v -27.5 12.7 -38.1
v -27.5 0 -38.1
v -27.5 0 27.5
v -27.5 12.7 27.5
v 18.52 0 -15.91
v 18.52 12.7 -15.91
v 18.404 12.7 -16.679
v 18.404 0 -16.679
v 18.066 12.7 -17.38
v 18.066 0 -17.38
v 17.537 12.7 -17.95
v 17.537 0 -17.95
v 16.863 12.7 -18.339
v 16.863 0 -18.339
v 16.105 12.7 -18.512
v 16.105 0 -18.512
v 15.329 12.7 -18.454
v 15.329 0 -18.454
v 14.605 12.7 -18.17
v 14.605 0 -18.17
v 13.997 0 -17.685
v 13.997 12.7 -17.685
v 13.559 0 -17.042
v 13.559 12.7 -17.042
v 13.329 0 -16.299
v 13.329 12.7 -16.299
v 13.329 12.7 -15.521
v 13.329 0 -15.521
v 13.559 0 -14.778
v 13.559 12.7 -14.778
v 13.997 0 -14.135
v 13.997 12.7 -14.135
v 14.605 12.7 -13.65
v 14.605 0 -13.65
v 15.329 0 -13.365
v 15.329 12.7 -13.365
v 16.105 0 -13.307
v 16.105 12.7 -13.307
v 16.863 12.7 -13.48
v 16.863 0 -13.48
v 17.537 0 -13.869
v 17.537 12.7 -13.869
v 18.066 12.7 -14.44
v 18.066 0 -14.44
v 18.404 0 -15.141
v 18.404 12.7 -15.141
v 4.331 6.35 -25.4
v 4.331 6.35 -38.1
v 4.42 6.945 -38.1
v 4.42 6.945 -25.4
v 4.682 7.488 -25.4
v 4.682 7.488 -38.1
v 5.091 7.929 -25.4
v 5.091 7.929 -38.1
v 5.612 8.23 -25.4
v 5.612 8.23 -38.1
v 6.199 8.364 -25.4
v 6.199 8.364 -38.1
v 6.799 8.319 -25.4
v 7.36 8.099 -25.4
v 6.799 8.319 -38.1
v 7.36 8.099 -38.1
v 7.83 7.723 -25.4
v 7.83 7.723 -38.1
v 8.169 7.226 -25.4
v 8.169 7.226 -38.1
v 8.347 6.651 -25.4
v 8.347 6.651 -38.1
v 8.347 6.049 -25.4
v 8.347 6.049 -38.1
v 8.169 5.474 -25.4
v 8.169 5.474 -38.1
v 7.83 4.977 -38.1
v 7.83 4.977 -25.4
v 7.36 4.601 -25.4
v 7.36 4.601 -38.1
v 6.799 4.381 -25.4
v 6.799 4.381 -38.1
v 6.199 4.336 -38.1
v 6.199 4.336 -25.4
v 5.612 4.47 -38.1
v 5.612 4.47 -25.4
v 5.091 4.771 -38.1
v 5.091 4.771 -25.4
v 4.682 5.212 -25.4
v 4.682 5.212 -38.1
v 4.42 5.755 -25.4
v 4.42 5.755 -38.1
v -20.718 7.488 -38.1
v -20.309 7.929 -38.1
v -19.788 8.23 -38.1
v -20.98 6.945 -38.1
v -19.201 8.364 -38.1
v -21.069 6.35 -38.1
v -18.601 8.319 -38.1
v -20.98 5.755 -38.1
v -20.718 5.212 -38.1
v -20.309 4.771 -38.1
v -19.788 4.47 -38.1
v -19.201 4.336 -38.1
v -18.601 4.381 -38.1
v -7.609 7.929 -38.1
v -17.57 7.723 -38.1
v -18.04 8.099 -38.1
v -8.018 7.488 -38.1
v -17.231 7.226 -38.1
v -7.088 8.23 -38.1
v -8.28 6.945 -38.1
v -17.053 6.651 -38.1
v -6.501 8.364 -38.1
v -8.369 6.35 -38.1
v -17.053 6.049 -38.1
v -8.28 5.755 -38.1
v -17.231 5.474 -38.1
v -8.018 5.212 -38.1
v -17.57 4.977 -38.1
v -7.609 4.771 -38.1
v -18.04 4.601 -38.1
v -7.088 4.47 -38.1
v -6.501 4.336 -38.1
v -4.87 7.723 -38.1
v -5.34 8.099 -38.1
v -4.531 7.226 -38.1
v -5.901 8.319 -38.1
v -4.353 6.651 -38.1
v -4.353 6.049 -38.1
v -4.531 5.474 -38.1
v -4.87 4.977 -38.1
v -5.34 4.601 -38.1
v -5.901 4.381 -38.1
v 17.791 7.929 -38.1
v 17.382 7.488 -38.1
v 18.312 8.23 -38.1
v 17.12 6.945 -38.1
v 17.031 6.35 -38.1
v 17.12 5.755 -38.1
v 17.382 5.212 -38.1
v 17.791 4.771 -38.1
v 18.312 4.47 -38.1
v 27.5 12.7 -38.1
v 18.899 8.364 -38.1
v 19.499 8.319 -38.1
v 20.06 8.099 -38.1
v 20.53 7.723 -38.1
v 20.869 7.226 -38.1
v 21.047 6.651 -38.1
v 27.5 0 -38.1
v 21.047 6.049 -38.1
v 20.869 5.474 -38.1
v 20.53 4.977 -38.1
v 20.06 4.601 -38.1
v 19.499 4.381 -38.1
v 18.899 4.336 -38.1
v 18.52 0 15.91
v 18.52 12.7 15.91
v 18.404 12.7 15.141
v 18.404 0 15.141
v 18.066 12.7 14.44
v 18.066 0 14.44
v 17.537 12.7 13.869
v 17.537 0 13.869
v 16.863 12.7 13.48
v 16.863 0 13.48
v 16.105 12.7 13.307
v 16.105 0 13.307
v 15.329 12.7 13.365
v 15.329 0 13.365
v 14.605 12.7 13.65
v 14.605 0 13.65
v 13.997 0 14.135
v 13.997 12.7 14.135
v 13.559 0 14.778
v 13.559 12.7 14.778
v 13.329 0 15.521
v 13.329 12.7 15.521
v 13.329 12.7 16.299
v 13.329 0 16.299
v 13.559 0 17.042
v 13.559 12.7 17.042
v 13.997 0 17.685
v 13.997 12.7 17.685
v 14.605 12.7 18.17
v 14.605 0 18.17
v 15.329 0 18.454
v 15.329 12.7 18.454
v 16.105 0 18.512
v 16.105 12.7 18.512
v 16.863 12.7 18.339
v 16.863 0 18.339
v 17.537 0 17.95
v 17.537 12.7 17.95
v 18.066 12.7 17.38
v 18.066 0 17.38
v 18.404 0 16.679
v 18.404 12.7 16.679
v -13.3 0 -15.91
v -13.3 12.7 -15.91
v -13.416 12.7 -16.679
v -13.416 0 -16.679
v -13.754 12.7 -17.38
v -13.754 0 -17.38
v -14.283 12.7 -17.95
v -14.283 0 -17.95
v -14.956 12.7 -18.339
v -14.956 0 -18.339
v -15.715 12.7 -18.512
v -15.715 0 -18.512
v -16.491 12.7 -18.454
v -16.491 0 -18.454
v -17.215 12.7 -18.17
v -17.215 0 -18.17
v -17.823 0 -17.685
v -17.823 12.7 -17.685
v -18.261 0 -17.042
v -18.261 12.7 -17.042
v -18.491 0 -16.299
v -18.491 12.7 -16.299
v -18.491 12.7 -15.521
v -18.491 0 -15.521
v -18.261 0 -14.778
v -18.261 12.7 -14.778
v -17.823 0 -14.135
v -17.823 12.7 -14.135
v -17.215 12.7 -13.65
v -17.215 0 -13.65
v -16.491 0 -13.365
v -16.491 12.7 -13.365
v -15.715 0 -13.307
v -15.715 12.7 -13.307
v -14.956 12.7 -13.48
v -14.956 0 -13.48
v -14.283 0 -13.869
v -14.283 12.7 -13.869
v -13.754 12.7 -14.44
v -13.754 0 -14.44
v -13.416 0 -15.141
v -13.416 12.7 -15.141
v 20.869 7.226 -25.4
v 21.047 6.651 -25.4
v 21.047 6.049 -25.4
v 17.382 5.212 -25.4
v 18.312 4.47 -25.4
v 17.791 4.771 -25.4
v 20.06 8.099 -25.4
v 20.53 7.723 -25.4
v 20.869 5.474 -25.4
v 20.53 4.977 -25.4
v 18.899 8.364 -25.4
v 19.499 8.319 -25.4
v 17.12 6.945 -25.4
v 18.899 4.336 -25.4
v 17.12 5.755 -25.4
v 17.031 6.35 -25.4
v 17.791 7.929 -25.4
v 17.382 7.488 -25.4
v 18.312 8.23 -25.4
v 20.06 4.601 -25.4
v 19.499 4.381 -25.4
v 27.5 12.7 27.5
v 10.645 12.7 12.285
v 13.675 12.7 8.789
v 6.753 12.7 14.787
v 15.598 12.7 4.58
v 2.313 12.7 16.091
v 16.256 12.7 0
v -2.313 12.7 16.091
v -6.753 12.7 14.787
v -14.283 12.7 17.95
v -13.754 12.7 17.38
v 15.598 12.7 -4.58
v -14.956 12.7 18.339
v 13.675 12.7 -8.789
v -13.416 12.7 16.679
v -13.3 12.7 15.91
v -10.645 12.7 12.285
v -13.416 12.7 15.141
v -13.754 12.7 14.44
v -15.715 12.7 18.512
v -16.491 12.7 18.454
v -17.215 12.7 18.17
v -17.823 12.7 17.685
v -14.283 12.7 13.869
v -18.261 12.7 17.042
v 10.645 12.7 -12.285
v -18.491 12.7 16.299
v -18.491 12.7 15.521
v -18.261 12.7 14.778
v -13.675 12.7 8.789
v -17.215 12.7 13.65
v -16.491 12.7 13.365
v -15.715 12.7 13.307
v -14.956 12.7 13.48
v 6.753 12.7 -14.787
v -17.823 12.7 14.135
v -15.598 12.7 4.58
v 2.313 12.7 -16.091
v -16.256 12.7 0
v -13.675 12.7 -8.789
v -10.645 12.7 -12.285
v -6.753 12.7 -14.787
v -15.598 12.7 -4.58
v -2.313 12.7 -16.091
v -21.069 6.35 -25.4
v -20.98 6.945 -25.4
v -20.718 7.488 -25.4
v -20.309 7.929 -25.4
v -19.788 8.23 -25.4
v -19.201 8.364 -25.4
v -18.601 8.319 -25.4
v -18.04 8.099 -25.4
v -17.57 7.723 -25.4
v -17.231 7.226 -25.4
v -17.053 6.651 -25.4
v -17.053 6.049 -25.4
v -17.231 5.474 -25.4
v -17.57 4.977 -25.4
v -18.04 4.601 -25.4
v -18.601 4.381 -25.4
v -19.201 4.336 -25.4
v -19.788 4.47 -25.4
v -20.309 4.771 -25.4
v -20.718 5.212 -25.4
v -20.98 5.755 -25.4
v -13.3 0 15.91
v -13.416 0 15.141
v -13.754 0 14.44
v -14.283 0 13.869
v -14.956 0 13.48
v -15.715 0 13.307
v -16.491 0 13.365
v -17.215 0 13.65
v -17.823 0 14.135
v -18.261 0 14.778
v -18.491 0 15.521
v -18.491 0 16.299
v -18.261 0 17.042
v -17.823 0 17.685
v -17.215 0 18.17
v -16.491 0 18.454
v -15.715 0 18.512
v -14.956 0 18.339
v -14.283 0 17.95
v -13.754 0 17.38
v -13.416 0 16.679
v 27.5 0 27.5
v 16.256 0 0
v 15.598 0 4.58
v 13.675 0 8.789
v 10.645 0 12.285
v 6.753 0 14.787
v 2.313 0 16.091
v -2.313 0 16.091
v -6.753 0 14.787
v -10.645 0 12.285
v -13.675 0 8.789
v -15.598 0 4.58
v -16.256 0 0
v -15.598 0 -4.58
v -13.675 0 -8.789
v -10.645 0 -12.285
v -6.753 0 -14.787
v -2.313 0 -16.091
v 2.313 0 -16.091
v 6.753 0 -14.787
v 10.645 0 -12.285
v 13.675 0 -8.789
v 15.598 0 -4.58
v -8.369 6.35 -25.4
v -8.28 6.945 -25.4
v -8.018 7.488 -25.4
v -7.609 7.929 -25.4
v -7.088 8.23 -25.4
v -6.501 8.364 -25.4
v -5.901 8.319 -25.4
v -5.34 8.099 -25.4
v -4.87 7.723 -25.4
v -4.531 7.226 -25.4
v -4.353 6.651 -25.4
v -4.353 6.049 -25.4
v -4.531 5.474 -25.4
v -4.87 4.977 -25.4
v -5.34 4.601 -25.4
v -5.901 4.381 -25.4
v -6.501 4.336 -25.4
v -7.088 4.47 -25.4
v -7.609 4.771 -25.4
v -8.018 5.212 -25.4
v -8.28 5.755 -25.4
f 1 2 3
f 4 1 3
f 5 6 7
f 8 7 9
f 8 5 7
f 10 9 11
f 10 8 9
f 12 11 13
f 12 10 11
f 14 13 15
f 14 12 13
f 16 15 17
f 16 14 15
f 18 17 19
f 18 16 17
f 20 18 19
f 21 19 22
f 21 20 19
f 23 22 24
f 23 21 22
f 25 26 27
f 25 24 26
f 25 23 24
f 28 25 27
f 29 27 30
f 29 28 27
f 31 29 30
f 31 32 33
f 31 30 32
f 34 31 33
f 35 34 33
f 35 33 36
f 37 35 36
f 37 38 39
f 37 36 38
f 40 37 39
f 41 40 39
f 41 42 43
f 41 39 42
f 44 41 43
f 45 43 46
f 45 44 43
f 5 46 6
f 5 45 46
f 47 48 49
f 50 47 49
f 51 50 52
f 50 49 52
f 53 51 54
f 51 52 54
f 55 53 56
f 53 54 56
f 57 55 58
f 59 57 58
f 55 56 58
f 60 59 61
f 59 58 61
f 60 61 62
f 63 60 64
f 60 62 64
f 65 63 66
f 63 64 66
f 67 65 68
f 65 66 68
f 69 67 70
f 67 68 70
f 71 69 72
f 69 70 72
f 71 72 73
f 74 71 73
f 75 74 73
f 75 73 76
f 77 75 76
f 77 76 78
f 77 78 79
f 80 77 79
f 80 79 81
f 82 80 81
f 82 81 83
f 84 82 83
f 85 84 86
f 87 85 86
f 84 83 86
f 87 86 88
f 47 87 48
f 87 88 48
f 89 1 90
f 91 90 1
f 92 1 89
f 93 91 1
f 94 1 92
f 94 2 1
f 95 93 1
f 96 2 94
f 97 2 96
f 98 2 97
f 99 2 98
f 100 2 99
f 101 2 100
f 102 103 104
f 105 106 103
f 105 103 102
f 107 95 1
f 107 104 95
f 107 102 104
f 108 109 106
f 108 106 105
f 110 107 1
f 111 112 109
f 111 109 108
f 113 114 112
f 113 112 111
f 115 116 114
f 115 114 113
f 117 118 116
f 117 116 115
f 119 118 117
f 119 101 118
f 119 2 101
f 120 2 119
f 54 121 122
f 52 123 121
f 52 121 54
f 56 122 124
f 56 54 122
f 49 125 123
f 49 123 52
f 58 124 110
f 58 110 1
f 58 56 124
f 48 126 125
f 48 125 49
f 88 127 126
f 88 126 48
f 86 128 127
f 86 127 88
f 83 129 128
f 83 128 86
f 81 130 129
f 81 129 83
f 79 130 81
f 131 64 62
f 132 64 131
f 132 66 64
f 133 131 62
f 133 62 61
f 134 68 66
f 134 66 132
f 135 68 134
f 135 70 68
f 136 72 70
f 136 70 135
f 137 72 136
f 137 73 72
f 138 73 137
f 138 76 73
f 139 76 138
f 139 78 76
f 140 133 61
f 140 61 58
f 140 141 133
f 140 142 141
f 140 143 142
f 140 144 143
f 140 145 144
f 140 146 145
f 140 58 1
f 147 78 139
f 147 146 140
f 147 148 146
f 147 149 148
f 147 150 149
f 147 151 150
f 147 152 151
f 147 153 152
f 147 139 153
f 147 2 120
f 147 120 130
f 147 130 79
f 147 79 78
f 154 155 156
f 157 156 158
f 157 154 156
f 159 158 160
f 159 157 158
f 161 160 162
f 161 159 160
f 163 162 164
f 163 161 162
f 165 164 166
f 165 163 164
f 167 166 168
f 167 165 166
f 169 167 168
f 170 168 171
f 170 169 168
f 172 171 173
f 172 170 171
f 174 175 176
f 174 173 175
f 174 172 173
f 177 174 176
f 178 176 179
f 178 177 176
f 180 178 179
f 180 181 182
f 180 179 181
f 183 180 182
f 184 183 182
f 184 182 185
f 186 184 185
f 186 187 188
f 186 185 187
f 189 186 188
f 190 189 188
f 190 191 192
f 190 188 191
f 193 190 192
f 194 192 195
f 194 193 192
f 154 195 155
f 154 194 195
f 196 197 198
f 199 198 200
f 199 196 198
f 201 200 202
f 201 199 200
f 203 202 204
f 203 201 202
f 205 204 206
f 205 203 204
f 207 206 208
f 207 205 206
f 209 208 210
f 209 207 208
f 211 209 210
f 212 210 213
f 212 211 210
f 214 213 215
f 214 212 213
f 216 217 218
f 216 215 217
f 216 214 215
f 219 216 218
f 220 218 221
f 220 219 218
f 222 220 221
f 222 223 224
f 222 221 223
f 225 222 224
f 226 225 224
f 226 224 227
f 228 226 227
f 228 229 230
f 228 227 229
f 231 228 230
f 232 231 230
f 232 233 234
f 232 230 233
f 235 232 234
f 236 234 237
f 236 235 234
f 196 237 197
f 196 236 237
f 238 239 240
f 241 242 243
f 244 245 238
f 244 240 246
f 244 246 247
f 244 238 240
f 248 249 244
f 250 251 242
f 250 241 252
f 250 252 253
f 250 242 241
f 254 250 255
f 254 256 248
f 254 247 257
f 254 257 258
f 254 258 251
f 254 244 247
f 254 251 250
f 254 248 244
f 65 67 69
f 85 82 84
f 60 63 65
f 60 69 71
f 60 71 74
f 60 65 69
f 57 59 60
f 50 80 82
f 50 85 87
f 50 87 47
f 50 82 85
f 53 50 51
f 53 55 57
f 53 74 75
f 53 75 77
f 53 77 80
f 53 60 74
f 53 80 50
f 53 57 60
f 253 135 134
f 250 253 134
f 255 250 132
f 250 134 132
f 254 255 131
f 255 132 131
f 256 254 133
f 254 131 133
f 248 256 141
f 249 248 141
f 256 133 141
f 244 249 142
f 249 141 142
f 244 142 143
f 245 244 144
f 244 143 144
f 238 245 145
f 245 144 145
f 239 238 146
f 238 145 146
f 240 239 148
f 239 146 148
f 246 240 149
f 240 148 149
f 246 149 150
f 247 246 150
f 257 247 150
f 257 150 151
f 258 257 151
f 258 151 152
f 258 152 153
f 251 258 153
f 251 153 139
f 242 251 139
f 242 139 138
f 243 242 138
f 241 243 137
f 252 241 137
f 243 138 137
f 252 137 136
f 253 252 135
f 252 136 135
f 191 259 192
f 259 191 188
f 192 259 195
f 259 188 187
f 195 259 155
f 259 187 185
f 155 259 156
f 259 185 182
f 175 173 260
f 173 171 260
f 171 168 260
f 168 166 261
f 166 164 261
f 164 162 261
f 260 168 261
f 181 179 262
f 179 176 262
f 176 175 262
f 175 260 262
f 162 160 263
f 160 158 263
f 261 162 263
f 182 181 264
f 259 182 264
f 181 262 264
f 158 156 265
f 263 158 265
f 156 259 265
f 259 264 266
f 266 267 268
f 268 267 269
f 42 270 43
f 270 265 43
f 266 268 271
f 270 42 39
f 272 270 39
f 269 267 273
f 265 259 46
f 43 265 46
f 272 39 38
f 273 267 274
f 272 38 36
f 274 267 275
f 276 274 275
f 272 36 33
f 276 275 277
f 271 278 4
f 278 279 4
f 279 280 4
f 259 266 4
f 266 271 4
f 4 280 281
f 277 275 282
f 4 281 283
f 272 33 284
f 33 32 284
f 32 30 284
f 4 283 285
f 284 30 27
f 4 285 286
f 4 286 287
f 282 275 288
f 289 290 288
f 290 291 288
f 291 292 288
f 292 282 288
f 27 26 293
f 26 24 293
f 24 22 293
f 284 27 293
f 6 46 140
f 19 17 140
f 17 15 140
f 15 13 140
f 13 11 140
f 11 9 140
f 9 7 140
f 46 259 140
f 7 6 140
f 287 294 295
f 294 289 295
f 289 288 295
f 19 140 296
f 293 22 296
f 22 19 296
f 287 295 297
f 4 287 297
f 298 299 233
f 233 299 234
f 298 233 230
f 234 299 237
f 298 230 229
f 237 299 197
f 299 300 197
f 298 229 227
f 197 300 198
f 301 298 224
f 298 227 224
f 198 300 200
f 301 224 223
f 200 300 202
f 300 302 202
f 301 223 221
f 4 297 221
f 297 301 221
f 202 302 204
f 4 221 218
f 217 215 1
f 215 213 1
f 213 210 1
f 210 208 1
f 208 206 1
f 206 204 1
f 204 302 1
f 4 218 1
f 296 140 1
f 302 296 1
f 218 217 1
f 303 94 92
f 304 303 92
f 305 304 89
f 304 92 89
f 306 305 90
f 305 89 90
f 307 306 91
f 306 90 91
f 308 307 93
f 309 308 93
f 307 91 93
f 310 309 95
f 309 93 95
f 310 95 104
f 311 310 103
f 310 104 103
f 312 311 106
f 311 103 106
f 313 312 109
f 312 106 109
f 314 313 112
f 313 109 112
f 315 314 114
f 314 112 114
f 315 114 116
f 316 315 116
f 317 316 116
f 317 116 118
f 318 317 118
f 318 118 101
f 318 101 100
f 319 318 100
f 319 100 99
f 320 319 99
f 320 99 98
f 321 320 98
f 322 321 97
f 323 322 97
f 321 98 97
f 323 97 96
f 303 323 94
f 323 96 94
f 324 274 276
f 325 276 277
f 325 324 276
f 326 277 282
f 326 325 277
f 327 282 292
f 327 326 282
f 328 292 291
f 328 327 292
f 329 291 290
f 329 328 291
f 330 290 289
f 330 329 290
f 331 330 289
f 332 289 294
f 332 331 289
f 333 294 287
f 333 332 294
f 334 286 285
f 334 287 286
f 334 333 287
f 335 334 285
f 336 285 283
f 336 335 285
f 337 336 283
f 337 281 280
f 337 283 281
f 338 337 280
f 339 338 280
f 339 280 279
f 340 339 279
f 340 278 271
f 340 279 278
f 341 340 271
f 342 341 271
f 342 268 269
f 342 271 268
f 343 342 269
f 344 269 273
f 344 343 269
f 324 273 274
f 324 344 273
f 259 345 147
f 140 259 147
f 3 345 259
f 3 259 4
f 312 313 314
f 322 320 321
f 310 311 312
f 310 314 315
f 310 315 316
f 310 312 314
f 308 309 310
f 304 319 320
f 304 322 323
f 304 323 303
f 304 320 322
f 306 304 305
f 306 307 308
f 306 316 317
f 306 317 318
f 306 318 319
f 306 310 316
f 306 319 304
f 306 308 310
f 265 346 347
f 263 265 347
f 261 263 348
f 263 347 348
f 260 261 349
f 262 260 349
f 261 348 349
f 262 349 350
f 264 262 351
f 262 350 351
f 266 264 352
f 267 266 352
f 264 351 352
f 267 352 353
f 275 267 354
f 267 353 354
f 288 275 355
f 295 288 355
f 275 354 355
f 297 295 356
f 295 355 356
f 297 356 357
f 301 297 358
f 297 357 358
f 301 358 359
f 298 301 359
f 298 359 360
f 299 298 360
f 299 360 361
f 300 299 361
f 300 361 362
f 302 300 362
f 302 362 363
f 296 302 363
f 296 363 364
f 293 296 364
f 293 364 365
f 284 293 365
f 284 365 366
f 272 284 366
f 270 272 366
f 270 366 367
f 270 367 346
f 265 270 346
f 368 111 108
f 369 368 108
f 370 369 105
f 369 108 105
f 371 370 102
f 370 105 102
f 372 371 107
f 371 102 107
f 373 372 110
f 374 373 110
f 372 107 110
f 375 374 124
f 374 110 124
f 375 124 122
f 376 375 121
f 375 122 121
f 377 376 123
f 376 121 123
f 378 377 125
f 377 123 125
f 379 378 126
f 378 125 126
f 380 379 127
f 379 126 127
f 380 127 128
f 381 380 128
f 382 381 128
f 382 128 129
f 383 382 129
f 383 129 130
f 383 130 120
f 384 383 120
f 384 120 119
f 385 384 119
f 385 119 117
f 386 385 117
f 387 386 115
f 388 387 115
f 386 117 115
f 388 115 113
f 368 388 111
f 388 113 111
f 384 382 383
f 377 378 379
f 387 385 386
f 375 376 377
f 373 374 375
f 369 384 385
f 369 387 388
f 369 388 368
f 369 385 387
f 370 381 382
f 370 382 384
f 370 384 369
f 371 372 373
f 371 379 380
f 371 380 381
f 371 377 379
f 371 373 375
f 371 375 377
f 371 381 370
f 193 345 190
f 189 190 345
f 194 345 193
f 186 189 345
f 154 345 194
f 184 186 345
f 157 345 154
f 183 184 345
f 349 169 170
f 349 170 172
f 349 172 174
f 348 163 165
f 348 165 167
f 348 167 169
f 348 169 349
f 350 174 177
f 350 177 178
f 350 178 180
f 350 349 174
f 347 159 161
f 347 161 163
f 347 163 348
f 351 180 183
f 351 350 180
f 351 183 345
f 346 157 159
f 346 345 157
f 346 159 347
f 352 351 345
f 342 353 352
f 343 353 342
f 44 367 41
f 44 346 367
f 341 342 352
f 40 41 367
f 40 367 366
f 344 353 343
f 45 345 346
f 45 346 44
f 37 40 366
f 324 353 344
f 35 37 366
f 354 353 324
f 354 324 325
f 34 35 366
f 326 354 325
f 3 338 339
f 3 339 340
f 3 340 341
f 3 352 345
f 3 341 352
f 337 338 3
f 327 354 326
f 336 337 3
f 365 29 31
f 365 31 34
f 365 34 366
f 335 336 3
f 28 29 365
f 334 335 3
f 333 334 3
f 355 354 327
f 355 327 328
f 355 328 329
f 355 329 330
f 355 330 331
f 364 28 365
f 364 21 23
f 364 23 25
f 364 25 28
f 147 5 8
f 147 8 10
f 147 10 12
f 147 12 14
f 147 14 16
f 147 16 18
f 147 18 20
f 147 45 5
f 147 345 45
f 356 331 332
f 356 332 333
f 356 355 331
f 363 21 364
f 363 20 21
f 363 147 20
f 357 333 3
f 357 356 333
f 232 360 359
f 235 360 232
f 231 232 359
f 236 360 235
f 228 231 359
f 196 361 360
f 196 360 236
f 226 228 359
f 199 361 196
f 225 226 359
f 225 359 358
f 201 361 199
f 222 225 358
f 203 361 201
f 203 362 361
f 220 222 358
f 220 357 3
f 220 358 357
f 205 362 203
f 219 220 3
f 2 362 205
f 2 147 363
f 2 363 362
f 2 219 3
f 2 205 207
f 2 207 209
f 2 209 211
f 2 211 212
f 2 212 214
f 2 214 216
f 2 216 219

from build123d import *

# Parameters (mm, degrees)
BOSS_EXTRUDE1_DEPTH = 12.7
CUT_EXTRUDE1_REACH  = 14.7
SKETCH1_R           = 2.60985
CUT_EXTRUDE2_REACH  = 14.7
SKETCH3_R           = 16.256
SKETCH5_R           = 2.0193
CUT_EXTRUDE3_DEPTH  = 12.7


with BuildPart() as part:
    # Sketch2 → Boss-Extrude1 (new body)
    with BuildSketch(Plane(origin=(0, 0, 0), x_dir=(1, 0, 0), z_dir=(0, 1, 0))):
        Polygon((-27.5, 0), (-27.5, 38.1), (27.5, 38.1), (27.5, 0), (27.5, -27.5), (-27.5, -27.5), align=None)
    extrude(amount=BOSS_EXTRUDE1_DEPTH)

    # Sketch1 → Cut-Extrude1 (cut, up to next)
    with BuildSketch(Plane(origin=(0, 0, 0), x_dir=(1, 0, 0), z_dir=(0, 1, 0)), mode=Mode.PRIVATE) as cut_extrude1_sk1:
        with Locations((15.909902577, 15.909902577)):
            Circle(SKETCH1_R)
    cut_extrude1_tool1 = extrude(cut_extrude1_sk1.sketch, amount=CUT_EXTRUDE1_REACH, mode=Mode.PRIVATE) & part.part
    add(cut_extrude1_tool1.solids().sort_by_distance((15.909903, 0, -15.909903))[0], mode=Mode.SUBTRACT)
    # Sketch1 → Cut-Extrude1 (cut, up to next)
    with BuildSketch(Plane(origin=(0, 0, 0), x_dir=(1, 0, 0), z_dir=(0, 1, 0)), mode=Mode.PRIVATE) as cut_extrude1_sk2:
        with Locations((-15.909902577, 15.909902577)):
            Circle(SKETCH1_R)
    cut_extrude1_tool2 = extrude(cut_extrude1_sk2.sketch, amount=CUT_EXTRUDE1_REACH, mode=Mode.PRIVATE) & part.part
    add(cut_extrude1_tool2.solids().sort_by_distance((-15.909903, 0, -15.909903))[0], mode=Mode.SUBTRACT)
    # Sketch1 → Cut-Extrude1 (cut, up to next)
    with BuildSketch(Plane(origin=(0, 0, 0), x_dir=(1, 0, 0), z_dir=(0, 1, 0)), mode=Mode.PRIVATE) as cut_extrude1_sk3:
        with Locations((15.909902577, -15.909902577)):
            Circle(SKETCH1_R)
    cut_extrude1_tool3 = extrude(cut_extrude1_sk3.sketch, amount=CUT_EXTRUDE1_REACH, mode=Mode.PRIVATE) & part.part
    add(cut_extrude1_tool3.solids().sort_by_distance((15.909903, 0, 15.909903))[0], mode=Mode.SUBTRACT)
    # Sketch1 → Cut-Extrude1 (cut, up to next)
    with BuildSketch(Plane(origin=(0, 0, 0), x_dir=(1, 0, 0), z_dir=(0, 1, 0)), mode=Mode.PRIVATE) as cut_extrude1_sk4:
        with Locations((-15.909902577, -15.909902577)):
            Circle(SKETCH1_R)
    cut_extrude1_tool4 = extrude(cut_extrude1_sk4.sketch, amount=CUT_EXTRUDE1_REACH, mode=Mode.PRIVATE) & part.part
    add(cut_extrude1_tool4.solids().sort_by_distance((-15.909903, 0, 15.909903))[0], mode=Mode.SUBTRACT)

    # Sketch3 → Cut-Extrude2 (cut, up to next)
    with BuildSketch(Plane.XZ, mode=Mode.PRIVATE) as cut_extrude2_sk1:
        Circle(SKETCH3_R)
    cut_extrude2_tool1 = extrude(cut_extrude2_sk1.sketch, amount=-CUT_EXTRUDE2_REACH, mode=Mode.PRIVATE) & part.part
    add(cut_extrude2_tool1.solids().sort_by_distance((0, 0, 0))[0], mode=Mode.SUBTRACT)

    # Sketch5 → Cut-Extrude3 (cut)
    with BuildSketch(Plane(origin=(0, 0, -38.1), x_dir=(-1, 0, 0), z_dir=(0, 0, -1))):
        with Locations((6.35, 6.35)):
            Circle(SKETCH5_R)
        with Locations((19.05, 6.35)):
            Circle(SKETCH5_R)
        with Locations((-19.05, 6.35)):
            Circle(SKETCH5_R)
        with Locations((-6.35, 6.35)):
            Circle(SKETCH5_R)
    extrude(amount=-CUT_EXTRUDE3_DEPTH, mode=Mode.SUBTRACT)


solid = part.part
